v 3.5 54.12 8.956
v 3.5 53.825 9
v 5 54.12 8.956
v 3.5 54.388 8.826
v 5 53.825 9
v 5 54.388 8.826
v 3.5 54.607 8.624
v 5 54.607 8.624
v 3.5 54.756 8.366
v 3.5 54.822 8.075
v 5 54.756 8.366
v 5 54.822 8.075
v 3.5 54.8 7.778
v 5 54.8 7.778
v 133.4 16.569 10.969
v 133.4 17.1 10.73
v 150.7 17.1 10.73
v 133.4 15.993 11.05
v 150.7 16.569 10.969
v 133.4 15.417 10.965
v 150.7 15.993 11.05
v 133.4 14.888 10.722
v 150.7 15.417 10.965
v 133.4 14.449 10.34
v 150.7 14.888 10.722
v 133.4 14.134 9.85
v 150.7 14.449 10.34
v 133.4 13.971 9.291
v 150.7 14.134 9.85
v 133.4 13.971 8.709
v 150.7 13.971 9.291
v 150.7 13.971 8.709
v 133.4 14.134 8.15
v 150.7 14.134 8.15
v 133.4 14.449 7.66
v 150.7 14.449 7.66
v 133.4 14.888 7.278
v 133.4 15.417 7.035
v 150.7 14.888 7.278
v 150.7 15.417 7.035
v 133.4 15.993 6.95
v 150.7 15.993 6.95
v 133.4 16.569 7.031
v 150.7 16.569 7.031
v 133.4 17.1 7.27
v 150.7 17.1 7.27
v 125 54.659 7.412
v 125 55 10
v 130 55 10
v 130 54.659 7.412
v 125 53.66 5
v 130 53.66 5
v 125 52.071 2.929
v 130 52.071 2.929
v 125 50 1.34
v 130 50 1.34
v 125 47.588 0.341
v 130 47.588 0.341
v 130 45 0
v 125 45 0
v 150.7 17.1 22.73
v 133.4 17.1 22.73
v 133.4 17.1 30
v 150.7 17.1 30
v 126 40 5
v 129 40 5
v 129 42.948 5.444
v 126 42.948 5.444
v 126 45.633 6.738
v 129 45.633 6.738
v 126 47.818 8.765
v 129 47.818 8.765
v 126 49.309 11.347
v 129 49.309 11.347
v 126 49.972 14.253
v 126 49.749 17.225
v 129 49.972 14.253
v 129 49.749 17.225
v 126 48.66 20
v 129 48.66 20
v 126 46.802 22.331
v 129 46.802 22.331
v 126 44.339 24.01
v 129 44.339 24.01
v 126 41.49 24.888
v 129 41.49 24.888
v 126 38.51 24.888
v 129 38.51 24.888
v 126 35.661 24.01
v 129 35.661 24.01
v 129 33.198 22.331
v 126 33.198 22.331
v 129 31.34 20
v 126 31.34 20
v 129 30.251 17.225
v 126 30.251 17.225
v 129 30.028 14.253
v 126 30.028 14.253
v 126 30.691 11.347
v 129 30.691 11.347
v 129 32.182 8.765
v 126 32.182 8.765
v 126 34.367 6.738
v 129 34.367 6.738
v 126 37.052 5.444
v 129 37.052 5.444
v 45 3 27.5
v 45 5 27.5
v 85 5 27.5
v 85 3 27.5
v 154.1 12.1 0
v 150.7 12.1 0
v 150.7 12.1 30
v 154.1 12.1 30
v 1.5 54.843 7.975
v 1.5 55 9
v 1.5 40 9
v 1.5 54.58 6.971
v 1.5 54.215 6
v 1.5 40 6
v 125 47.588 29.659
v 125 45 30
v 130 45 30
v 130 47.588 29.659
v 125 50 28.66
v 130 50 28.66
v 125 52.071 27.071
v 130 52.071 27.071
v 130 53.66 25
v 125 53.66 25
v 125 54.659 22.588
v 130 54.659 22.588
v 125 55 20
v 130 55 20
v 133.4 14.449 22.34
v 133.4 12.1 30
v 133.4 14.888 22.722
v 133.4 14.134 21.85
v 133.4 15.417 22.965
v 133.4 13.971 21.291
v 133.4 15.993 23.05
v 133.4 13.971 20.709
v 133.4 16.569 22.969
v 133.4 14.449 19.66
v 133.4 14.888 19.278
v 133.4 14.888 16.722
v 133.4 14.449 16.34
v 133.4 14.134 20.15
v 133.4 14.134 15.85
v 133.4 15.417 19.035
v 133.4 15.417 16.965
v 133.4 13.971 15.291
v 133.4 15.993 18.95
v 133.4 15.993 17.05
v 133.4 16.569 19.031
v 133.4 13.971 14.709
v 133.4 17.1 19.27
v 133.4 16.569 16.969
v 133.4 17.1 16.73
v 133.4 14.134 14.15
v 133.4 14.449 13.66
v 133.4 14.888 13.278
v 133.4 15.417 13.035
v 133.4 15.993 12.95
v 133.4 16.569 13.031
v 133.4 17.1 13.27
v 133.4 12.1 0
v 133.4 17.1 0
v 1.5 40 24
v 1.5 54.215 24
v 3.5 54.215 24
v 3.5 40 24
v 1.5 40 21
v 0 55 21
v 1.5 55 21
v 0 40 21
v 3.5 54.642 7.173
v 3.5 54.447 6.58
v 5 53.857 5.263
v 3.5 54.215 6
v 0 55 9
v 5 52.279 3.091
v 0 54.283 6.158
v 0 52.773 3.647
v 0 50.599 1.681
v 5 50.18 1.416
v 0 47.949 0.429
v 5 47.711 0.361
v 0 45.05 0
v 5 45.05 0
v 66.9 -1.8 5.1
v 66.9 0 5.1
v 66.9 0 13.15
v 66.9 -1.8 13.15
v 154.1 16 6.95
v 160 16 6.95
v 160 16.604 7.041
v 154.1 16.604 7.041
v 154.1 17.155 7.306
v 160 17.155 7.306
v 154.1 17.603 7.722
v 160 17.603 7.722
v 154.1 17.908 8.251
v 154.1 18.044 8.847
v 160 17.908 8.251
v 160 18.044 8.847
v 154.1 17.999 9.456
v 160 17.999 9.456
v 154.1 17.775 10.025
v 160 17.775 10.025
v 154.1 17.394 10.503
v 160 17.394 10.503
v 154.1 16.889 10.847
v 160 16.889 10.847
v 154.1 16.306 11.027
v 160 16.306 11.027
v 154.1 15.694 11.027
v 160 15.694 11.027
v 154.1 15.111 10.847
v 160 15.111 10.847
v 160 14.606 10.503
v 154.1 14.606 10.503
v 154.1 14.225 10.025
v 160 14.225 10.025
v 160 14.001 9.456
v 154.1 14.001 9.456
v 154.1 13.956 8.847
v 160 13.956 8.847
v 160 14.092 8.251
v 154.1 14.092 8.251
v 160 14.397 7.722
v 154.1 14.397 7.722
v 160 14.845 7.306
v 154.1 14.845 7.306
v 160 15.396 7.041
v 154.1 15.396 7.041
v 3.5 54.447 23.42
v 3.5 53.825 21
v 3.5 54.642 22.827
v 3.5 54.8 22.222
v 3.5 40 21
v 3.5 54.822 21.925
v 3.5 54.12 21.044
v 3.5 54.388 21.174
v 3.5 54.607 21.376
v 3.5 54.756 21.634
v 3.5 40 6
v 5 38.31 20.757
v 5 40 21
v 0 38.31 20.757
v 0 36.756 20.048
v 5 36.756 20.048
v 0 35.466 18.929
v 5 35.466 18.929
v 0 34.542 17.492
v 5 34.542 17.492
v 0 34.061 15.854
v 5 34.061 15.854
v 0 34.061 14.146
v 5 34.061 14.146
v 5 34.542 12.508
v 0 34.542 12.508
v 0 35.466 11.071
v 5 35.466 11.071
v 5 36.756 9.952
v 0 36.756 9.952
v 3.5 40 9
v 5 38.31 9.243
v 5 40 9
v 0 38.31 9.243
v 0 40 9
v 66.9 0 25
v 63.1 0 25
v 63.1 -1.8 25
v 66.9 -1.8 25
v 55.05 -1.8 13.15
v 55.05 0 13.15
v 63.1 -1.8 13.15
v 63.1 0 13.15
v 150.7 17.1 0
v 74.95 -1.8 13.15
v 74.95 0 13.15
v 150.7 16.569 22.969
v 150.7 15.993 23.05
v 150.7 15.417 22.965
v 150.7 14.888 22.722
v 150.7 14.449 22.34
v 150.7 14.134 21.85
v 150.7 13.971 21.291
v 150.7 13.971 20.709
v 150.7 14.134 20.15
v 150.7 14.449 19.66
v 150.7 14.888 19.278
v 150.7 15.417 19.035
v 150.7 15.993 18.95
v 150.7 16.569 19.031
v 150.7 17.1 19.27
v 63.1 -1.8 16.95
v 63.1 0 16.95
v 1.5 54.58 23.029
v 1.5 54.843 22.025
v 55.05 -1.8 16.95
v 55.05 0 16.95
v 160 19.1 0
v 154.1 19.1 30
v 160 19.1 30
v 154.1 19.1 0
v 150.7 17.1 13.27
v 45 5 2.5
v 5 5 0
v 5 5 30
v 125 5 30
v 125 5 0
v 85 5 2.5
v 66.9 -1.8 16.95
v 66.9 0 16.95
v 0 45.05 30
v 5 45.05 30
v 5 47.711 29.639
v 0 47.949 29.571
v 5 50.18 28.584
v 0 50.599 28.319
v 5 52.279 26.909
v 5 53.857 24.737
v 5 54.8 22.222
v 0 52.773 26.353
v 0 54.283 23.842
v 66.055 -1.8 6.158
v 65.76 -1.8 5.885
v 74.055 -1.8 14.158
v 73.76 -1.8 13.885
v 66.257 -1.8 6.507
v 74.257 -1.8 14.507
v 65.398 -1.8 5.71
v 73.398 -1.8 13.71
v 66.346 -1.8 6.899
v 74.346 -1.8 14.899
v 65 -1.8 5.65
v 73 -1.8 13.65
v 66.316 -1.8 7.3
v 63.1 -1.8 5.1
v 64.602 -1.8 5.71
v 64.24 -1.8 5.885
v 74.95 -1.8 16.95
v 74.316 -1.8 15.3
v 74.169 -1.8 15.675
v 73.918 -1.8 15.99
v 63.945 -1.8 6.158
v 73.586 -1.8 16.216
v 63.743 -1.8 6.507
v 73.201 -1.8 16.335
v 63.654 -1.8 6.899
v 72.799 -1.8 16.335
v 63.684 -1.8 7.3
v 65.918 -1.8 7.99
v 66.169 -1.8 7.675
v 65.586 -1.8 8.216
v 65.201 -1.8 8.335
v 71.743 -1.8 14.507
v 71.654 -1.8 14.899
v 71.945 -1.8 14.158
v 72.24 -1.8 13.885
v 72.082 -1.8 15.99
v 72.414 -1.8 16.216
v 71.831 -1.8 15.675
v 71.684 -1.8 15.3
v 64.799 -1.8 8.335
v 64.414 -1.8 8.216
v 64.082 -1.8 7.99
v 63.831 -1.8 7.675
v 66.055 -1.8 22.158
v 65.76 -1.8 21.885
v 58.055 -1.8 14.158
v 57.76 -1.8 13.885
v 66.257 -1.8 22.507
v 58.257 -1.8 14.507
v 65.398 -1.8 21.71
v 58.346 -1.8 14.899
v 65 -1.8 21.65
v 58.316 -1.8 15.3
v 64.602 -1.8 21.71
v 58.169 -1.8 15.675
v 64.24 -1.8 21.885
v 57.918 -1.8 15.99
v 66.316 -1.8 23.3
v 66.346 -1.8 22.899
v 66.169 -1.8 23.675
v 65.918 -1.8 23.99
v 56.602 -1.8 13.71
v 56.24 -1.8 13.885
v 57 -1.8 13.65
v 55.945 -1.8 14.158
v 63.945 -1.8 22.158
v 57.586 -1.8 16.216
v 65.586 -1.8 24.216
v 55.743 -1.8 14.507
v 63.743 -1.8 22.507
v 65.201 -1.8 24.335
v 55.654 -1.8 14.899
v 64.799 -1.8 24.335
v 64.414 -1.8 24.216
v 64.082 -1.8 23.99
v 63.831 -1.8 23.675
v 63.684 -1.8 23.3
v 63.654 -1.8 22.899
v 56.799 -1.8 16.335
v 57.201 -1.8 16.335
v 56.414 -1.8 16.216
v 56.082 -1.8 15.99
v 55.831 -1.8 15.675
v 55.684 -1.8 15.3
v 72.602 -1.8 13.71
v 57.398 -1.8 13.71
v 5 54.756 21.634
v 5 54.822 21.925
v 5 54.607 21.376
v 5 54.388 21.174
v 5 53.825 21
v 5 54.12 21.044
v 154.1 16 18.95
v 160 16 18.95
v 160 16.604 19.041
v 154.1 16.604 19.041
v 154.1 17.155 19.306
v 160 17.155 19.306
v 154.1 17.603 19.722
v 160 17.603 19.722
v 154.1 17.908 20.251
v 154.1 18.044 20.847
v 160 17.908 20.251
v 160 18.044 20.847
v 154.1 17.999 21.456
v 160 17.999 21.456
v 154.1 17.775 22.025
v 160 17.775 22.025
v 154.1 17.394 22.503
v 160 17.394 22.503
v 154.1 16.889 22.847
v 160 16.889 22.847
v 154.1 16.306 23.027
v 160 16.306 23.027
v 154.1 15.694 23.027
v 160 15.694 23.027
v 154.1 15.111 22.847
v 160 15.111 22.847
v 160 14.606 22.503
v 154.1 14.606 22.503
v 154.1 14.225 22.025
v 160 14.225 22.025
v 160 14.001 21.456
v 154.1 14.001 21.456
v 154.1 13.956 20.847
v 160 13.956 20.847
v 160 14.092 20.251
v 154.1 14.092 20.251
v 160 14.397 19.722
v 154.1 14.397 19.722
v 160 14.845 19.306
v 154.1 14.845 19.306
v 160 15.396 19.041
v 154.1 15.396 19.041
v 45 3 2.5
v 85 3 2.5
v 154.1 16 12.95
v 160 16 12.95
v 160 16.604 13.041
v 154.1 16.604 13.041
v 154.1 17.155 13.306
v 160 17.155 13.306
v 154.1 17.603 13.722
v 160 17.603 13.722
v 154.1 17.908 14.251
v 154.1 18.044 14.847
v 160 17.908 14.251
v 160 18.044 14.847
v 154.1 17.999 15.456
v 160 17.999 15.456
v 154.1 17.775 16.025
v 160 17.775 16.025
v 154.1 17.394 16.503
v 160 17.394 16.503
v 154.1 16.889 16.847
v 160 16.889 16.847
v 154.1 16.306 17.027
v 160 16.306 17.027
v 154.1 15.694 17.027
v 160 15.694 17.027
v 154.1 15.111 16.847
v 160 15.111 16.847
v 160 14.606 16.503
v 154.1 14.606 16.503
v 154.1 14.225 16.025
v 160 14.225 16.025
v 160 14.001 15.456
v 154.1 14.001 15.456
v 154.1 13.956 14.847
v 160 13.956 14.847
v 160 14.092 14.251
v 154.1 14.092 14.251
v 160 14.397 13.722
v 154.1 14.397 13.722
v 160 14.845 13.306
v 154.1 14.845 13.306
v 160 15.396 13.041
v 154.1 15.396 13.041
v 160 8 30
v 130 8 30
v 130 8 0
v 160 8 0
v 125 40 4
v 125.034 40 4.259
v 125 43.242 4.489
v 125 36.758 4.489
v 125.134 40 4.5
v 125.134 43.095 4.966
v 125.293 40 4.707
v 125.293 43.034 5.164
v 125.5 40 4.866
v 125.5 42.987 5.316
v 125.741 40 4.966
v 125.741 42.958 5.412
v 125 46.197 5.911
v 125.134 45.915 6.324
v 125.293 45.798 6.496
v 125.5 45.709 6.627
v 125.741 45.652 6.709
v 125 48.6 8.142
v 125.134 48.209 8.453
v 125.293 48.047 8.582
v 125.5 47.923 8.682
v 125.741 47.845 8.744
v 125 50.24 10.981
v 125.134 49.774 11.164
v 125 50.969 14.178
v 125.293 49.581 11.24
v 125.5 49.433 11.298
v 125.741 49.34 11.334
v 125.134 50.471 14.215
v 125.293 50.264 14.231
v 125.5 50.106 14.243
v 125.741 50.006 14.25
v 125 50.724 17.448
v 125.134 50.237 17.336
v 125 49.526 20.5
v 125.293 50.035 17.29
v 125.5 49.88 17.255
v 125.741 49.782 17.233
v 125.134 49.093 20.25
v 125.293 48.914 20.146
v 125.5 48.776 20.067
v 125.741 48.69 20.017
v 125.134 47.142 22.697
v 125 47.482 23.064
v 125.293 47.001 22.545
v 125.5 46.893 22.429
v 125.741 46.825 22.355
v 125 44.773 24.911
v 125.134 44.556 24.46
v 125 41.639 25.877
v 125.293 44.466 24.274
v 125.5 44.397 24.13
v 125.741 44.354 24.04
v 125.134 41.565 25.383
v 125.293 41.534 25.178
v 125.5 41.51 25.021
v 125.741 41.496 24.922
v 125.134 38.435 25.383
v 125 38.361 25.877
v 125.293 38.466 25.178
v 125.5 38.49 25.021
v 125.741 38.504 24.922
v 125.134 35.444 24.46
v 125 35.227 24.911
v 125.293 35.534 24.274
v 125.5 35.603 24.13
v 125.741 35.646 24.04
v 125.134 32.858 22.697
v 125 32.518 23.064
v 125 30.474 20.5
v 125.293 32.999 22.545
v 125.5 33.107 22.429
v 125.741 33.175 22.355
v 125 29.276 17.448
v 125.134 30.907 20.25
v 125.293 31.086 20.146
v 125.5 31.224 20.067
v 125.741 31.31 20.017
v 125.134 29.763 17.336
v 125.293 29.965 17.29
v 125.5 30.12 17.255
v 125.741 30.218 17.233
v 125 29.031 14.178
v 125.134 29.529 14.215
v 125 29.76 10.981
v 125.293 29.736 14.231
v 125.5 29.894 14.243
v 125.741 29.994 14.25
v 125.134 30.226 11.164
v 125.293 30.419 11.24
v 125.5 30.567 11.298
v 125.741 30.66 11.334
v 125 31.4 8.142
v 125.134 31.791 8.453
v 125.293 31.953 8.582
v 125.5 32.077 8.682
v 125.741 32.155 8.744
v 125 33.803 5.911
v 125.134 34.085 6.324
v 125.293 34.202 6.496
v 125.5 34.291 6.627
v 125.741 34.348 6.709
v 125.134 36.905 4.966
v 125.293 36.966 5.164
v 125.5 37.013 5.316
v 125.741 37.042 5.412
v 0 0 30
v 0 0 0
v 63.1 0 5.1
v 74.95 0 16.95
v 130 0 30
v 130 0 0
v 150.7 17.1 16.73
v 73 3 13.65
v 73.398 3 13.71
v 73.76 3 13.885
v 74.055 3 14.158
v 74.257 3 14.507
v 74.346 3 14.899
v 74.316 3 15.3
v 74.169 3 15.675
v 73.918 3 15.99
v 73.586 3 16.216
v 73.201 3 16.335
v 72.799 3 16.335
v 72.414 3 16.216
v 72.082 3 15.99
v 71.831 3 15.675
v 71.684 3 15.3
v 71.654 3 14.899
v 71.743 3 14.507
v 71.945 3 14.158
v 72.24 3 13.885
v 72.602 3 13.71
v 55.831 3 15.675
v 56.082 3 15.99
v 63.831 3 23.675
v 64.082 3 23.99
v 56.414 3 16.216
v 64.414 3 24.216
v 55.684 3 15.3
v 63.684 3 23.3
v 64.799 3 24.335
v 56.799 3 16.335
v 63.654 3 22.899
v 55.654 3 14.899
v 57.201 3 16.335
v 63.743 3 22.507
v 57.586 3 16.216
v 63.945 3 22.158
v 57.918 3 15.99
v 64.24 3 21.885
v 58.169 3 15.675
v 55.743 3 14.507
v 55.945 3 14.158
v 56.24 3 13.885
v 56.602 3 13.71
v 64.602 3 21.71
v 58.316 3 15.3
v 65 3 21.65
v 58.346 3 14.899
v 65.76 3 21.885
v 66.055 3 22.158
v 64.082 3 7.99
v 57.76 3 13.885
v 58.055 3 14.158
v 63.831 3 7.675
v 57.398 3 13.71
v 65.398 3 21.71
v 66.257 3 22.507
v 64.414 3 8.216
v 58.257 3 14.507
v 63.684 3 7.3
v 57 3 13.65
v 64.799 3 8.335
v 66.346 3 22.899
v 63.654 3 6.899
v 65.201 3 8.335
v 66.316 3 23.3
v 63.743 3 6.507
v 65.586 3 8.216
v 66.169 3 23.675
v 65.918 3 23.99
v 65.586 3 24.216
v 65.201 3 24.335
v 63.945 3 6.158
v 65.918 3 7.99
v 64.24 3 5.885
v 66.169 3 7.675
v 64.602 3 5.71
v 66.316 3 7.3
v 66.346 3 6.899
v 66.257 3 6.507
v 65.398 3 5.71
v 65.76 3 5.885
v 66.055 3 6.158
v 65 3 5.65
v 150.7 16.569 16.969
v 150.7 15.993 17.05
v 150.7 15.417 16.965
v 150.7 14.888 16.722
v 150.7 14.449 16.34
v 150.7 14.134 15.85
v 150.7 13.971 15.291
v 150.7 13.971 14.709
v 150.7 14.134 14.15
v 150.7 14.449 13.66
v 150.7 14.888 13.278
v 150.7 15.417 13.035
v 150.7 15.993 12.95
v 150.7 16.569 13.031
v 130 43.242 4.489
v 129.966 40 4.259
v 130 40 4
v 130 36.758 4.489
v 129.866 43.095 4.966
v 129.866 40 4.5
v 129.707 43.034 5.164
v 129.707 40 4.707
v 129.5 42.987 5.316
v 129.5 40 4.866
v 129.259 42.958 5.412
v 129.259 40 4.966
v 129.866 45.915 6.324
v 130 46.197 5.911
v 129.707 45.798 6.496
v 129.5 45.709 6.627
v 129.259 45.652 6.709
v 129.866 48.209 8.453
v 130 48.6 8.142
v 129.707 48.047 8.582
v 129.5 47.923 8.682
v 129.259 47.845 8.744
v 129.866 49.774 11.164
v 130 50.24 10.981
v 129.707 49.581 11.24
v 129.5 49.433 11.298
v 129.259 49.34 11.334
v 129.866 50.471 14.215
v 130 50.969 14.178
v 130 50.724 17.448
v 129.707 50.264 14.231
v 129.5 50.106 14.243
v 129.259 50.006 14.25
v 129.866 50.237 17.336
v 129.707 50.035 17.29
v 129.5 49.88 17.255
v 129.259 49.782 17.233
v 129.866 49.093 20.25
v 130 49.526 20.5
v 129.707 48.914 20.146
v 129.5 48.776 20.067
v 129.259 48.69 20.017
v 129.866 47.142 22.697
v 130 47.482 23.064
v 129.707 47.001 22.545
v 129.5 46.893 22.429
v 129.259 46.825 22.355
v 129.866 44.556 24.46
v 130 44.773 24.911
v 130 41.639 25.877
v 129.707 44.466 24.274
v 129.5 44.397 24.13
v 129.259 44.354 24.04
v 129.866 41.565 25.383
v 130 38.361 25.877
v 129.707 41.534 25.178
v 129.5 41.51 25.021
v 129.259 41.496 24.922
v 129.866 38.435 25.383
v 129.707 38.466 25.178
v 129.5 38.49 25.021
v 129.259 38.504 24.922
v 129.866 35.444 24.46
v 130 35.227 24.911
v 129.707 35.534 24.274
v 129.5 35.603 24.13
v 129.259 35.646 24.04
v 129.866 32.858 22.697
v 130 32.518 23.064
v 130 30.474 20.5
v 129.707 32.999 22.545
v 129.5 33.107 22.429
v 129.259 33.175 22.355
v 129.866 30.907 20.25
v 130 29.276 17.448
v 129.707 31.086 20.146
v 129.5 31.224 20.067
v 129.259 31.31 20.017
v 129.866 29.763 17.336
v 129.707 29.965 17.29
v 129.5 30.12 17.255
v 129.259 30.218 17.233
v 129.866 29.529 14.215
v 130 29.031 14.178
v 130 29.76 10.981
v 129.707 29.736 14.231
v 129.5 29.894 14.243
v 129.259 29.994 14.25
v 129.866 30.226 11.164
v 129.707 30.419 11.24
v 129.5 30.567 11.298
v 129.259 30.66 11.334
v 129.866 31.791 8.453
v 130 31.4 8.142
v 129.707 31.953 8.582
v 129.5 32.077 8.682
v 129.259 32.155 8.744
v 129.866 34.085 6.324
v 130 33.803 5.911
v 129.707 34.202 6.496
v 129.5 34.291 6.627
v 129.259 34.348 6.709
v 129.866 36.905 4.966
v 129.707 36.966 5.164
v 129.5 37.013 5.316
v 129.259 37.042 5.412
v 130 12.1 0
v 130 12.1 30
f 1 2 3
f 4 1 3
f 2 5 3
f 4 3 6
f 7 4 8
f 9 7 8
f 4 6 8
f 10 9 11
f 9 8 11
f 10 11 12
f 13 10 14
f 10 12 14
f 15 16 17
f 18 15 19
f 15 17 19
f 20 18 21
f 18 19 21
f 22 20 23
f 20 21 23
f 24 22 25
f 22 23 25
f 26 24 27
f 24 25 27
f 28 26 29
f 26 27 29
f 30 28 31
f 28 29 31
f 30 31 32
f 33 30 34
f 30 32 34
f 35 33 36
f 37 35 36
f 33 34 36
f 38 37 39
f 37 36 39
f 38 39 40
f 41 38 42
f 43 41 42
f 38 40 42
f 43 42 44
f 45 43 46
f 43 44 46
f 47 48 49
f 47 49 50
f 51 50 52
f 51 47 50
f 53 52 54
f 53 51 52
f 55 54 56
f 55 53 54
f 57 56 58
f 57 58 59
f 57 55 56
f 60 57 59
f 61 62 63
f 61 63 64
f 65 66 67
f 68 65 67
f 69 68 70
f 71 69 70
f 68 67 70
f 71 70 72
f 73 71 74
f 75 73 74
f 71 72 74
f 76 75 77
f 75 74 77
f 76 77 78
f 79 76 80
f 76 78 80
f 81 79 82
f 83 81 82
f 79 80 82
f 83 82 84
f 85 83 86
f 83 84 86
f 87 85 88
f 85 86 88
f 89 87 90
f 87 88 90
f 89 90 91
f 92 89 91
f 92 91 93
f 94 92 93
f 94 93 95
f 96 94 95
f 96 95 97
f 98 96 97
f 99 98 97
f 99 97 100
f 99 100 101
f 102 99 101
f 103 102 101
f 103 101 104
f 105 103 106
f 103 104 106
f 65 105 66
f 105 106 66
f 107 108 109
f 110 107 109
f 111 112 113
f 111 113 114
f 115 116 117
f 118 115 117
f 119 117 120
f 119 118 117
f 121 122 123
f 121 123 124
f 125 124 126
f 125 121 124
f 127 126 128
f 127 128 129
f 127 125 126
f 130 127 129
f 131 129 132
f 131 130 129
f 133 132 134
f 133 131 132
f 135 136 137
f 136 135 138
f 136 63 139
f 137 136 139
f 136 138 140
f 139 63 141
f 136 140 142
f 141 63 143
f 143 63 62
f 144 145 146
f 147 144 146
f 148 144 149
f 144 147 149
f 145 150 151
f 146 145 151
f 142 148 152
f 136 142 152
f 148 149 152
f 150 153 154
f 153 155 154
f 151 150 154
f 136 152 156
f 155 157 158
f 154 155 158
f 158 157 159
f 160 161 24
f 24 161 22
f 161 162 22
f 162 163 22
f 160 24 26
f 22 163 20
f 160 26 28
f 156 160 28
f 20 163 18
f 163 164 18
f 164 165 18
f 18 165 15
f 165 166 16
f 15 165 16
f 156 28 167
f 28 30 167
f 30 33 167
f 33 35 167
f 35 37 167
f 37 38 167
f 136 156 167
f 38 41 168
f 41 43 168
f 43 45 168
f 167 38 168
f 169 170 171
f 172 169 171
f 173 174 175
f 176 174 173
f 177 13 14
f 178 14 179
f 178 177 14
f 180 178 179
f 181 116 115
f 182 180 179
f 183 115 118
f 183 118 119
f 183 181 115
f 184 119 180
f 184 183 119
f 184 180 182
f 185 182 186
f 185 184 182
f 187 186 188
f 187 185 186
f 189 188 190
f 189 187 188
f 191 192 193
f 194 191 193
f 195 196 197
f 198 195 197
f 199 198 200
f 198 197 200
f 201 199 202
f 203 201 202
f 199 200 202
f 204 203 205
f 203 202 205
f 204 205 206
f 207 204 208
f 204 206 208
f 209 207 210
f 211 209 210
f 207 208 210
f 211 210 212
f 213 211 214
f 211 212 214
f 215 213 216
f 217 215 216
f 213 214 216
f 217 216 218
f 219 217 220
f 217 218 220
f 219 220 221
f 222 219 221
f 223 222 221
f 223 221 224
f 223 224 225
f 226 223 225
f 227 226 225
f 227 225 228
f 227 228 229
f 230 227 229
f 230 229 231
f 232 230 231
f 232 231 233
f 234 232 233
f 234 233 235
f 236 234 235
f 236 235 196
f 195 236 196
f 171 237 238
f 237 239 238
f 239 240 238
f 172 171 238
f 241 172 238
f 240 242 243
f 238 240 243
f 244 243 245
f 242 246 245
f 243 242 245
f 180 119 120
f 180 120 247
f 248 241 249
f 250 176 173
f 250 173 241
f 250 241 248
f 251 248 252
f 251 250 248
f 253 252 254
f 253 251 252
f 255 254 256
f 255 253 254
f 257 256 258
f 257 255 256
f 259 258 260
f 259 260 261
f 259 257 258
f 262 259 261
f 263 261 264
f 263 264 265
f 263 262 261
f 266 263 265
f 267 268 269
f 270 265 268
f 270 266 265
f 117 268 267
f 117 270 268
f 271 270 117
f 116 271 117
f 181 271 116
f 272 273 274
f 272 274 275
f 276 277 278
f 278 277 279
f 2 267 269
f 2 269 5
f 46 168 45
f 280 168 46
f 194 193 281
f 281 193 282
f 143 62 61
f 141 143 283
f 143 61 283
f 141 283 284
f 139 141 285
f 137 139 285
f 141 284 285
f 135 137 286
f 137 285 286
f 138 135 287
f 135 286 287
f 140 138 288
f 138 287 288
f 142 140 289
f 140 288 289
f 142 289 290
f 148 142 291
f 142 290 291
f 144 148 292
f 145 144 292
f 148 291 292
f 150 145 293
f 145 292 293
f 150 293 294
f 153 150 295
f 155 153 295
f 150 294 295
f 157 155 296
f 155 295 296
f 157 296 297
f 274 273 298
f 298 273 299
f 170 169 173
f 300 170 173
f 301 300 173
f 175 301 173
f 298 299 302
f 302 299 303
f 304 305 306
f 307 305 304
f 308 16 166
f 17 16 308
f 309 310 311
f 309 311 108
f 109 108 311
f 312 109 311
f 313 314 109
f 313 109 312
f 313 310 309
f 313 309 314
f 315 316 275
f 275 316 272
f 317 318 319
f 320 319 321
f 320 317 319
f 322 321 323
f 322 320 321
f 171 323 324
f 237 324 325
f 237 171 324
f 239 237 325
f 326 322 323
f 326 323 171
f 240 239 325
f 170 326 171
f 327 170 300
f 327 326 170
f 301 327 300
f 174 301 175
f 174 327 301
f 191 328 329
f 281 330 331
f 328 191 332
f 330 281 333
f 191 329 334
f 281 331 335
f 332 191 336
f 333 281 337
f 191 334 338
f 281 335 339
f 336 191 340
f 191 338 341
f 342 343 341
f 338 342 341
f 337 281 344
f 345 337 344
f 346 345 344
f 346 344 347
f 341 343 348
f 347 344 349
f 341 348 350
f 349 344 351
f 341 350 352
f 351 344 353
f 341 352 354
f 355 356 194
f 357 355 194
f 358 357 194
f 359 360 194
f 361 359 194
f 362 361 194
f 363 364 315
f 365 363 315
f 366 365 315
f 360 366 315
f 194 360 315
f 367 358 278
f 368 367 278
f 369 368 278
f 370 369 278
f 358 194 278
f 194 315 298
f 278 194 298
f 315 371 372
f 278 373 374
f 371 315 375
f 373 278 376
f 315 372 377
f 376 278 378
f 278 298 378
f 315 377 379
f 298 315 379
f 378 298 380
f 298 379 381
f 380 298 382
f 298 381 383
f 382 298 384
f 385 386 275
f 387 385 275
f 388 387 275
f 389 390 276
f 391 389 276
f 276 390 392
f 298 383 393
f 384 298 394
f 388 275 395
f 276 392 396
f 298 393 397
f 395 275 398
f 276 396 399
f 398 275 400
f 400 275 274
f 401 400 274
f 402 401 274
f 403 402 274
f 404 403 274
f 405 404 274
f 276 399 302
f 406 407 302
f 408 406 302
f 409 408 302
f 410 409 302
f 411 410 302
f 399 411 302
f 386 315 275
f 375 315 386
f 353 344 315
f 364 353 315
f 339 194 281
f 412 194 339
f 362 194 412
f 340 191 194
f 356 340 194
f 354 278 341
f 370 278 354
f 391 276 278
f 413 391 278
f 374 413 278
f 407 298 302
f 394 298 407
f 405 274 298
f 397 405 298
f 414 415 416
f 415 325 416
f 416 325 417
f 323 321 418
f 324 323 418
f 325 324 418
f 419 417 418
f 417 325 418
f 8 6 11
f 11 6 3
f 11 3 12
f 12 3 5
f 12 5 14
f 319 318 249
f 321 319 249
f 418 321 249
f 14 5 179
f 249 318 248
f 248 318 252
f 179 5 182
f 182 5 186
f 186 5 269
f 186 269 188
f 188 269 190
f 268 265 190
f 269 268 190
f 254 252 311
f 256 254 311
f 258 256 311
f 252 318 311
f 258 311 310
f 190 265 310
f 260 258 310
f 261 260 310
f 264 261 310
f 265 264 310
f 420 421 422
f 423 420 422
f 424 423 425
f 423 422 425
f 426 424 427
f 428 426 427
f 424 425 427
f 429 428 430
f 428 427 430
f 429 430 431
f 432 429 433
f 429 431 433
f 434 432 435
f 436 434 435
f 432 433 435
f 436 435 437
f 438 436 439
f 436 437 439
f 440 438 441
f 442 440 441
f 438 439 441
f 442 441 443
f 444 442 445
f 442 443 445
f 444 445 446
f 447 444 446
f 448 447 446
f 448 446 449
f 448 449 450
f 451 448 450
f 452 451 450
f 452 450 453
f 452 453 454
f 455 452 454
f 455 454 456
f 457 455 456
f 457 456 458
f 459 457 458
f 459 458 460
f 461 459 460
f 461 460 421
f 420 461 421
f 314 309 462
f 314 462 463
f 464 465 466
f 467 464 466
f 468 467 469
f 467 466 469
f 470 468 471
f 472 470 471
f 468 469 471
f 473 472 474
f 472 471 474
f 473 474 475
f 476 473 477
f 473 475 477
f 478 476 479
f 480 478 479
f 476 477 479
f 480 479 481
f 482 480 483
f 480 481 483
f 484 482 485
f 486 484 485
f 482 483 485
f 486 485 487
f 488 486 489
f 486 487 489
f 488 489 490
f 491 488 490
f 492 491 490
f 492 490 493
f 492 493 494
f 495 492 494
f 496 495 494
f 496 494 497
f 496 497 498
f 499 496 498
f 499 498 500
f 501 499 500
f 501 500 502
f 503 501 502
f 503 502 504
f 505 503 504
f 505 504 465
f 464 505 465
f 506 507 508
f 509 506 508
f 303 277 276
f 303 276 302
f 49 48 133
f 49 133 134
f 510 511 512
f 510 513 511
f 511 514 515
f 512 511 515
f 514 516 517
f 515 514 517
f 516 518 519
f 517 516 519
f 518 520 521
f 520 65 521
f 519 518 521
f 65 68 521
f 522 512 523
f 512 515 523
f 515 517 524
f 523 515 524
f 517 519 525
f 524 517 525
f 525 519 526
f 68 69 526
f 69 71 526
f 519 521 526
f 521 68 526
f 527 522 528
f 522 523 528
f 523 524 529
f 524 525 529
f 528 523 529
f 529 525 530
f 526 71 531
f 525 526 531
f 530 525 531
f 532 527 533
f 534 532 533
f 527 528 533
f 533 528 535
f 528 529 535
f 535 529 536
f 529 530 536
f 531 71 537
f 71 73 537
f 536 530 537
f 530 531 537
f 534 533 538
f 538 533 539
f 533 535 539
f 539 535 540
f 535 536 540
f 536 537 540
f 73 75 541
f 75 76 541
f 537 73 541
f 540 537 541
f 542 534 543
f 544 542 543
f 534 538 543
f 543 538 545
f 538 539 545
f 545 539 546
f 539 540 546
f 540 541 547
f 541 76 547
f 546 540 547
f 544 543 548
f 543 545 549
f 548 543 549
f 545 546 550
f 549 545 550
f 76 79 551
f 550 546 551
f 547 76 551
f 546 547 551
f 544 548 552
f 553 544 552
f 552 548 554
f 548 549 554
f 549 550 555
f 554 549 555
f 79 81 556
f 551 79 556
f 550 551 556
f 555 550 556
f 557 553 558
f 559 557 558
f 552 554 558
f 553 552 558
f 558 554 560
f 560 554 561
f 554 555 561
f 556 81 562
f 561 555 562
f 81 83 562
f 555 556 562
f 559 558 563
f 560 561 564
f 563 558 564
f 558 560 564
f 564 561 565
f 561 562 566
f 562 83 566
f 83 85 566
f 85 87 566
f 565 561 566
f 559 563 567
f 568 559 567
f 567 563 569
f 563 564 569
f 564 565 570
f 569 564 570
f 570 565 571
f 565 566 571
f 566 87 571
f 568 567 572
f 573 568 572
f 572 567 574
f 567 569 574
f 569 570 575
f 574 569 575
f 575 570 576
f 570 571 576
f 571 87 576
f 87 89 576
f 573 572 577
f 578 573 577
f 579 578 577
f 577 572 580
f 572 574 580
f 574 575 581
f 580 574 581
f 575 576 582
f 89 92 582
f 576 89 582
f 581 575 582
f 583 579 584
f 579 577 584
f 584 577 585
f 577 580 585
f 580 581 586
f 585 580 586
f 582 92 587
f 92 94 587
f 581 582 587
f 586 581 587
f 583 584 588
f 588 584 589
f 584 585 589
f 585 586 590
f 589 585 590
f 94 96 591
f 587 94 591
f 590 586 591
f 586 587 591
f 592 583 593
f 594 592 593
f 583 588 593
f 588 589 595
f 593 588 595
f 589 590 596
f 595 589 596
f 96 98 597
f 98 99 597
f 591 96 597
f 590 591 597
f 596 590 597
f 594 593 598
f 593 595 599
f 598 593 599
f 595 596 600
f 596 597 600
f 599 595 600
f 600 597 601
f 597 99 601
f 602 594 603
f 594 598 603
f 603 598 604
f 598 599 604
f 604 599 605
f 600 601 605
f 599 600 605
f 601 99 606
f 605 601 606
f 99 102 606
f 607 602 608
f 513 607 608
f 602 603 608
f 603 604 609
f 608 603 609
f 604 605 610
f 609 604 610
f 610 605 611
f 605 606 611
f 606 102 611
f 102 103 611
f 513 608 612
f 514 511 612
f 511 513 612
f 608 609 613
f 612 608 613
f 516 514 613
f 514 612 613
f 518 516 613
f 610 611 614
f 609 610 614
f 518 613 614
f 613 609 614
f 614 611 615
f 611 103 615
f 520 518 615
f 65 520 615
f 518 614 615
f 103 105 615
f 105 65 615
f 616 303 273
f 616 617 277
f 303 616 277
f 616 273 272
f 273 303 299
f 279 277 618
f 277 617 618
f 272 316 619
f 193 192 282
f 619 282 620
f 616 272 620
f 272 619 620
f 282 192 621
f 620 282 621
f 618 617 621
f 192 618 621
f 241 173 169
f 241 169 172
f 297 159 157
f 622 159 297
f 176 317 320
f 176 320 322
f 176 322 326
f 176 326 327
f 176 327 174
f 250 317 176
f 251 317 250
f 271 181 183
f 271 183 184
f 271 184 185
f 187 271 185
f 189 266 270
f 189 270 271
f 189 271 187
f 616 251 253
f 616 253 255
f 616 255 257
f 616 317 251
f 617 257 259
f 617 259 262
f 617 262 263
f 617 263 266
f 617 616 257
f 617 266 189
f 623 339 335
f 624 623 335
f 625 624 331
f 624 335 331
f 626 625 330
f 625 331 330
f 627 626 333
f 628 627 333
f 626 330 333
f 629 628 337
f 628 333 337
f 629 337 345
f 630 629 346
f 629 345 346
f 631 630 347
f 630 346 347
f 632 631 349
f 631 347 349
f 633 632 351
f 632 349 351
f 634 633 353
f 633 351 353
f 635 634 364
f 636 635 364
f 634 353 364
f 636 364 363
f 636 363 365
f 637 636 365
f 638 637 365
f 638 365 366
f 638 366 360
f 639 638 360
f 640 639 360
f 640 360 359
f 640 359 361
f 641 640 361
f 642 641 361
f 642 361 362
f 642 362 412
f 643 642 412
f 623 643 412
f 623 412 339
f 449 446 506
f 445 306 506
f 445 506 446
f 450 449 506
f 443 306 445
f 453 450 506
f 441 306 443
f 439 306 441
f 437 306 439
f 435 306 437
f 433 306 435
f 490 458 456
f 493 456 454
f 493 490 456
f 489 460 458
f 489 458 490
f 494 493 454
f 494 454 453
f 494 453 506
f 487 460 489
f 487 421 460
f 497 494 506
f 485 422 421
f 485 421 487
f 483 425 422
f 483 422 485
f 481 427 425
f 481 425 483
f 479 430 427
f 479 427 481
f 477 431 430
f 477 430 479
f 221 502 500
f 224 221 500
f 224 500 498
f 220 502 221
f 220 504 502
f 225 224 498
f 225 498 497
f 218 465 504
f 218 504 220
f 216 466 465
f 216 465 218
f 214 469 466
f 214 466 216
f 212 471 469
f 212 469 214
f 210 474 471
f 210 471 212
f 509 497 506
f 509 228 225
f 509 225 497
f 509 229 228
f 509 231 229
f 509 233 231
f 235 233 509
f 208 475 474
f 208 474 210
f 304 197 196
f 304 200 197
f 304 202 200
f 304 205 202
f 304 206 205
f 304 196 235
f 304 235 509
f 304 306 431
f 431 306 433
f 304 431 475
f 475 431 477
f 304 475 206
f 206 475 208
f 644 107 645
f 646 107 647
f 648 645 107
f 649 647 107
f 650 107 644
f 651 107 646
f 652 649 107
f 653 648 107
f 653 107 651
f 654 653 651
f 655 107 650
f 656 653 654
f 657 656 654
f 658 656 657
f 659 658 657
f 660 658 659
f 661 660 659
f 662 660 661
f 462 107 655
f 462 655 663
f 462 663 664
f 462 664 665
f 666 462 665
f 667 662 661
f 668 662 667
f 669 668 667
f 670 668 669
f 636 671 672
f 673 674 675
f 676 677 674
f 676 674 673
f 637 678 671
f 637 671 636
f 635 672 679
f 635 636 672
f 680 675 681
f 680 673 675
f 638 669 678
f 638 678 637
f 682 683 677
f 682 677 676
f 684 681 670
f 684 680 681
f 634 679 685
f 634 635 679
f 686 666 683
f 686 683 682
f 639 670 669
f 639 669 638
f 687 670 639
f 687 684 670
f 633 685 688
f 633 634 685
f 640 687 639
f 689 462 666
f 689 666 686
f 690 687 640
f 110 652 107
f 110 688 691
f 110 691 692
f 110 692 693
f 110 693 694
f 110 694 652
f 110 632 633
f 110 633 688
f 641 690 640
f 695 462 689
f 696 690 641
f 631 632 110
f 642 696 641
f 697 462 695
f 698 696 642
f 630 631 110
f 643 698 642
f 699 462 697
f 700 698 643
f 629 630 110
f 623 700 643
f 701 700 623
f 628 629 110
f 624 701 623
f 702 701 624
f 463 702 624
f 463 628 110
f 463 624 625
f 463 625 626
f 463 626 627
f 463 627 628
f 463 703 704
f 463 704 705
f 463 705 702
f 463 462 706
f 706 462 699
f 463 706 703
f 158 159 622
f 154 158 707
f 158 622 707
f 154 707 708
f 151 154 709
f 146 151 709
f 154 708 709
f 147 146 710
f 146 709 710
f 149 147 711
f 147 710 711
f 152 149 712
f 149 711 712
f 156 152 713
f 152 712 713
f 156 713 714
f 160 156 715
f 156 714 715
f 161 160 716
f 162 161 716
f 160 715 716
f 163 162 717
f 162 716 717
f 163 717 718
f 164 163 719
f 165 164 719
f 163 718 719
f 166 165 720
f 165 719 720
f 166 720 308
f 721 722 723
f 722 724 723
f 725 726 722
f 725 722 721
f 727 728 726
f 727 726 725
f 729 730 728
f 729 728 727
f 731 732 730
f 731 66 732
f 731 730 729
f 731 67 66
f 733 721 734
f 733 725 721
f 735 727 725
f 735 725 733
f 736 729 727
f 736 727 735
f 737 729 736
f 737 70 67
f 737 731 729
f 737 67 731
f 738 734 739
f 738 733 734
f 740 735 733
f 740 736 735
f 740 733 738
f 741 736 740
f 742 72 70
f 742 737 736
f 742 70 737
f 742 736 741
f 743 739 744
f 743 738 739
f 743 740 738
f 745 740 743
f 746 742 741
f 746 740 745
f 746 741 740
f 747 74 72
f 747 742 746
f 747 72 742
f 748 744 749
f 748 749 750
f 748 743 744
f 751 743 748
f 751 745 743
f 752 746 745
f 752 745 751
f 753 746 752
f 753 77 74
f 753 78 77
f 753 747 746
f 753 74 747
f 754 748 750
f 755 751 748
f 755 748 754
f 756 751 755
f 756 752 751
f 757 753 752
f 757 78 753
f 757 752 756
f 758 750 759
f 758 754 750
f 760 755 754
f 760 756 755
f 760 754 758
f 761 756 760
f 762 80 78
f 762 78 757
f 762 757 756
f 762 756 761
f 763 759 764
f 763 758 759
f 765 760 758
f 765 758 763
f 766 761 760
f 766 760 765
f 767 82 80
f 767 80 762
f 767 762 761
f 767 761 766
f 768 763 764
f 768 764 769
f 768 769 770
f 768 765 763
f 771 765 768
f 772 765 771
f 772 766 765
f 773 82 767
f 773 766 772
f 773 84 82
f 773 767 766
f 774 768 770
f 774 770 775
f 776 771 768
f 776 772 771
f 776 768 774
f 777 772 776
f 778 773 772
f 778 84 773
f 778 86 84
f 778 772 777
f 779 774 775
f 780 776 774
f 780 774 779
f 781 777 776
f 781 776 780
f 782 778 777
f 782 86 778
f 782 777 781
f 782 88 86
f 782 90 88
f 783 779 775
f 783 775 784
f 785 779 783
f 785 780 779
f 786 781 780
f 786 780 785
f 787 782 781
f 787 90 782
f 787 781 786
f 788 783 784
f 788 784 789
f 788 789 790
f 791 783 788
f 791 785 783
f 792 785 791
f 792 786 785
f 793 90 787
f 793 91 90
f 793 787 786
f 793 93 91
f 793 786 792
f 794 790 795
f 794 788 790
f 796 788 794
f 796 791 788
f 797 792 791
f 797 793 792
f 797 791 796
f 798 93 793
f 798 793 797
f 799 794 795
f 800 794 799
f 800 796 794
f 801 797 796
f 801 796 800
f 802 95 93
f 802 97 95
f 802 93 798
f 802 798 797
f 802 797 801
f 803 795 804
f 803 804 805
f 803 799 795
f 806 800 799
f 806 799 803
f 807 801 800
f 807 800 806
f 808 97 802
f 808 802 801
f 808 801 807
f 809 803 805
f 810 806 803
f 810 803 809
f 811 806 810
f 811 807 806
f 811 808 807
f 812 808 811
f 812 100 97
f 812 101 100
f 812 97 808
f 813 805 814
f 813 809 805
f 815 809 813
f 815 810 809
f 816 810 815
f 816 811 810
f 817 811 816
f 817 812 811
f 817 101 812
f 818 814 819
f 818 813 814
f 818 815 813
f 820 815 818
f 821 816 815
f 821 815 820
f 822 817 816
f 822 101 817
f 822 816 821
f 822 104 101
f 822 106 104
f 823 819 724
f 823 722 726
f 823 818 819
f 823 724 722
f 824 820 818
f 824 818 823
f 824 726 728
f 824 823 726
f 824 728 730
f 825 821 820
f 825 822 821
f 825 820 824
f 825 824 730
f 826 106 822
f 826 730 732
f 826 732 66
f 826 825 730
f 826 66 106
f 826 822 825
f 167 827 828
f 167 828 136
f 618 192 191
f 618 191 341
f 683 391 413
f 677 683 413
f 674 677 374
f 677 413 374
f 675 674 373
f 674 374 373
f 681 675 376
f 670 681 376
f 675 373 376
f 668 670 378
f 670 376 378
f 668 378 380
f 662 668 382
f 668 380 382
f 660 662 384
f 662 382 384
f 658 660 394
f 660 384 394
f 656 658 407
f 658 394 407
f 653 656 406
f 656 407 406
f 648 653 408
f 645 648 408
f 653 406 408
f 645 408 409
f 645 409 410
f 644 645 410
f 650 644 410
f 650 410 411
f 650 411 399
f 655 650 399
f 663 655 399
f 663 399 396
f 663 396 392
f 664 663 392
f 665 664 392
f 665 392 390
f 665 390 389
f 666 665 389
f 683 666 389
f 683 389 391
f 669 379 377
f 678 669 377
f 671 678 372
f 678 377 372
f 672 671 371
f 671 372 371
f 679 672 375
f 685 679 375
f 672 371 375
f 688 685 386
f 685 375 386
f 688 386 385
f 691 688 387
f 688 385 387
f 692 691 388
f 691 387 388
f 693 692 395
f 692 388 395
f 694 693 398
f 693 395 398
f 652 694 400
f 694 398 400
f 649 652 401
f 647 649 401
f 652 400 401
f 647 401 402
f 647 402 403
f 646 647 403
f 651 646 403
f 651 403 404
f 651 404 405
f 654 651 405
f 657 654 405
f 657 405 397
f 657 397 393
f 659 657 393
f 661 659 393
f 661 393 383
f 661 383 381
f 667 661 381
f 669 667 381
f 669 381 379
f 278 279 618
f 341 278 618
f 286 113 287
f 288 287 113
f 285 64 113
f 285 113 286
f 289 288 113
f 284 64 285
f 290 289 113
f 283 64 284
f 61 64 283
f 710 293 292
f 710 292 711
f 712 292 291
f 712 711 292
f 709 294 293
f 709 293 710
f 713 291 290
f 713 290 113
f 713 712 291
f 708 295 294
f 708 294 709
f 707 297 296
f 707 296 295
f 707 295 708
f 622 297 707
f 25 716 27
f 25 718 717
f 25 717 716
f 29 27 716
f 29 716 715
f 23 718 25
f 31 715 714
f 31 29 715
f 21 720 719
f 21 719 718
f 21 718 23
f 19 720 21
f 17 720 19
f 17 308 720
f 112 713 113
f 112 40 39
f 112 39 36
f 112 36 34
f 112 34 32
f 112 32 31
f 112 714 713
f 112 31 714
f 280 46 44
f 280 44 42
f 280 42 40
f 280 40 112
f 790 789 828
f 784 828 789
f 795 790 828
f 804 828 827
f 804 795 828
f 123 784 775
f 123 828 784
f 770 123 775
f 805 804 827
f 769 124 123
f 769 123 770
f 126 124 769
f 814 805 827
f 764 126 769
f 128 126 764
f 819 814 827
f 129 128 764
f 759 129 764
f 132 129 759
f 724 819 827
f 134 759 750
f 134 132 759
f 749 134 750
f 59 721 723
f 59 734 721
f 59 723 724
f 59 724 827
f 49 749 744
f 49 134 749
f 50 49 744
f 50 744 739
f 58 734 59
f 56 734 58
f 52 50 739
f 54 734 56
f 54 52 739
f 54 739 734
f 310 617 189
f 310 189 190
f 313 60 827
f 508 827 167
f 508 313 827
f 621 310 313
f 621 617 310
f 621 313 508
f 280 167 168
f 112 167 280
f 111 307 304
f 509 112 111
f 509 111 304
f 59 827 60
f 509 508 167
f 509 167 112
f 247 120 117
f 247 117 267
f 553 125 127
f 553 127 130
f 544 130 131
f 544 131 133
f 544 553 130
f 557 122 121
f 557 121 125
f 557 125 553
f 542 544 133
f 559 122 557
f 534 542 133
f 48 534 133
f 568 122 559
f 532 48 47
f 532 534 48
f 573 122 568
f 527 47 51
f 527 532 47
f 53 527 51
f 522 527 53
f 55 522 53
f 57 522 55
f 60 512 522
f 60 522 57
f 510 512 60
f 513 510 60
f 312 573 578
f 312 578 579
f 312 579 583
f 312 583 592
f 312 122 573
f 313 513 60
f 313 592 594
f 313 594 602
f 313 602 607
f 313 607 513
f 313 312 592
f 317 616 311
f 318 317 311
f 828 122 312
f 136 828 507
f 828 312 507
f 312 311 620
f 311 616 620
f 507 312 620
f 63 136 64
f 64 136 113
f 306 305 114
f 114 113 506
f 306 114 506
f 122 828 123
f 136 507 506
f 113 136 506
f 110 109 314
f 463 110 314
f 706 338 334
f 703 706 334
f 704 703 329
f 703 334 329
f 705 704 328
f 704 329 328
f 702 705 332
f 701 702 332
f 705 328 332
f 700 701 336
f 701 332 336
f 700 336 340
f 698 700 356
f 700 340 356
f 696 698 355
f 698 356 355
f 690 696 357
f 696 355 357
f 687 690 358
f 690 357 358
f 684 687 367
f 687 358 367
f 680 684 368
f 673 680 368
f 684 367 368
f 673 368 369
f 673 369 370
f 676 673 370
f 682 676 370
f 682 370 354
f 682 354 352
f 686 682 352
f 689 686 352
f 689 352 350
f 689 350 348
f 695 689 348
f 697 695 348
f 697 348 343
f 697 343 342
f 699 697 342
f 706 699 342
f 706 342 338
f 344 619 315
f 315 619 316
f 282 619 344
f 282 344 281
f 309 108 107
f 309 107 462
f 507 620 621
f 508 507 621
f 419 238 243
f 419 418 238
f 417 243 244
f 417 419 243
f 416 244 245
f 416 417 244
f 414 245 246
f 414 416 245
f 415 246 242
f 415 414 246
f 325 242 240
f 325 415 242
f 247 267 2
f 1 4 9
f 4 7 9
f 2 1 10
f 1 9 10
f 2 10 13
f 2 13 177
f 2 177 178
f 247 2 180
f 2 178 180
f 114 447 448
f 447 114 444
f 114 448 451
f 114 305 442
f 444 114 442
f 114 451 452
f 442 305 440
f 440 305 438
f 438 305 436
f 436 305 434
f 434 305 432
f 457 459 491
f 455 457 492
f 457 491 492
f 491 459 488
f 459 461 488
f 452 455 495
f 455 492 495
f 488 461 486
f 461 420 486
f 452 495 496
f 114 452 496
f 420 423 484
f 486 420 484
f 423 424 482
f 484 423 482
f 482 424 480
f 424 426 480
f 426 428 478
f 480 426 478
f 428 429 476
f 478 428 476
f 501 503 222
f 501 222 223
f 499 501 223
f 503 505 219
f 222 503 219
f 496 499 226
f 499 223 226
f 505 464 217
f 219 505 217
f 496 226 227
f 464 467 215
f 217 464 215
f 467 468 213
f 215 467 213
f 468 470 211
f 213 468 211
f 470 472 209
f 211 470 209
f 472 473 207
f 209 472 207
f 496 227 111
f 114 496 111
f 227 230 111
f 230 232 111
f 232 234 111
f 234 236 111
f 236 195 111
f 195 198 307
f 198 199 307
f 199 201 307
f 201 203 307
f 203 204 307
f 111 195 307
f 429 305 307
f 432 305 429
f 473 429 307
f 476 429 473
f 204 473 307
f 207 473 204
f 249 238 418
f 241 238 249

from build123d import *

# Parameters (mm, degrees)
SKETCH1_W           = 130
SKETCH1_H           = 30
BOSS_EXTRUDE1_DEPTH = 5
BOSS_EXTRUDE3_DEPTH = 1.8
SKETCH6_W           = 40
SKETCH6_H           = 25
CUT_EXTRUDE2_DEPTH  = 2
SKETCH5_R           = 1.35
CUT_EXTRUDE3_DEPTH  = 6
SKETCH8_W           = 5
SKETCH8_H           = 30
BOSS_EXTRUDE4_DEPTH = 50
SKETCH9_R           = 10
CUT_EXTRUDE4_DEPTH  = 5
SKETCH10_W          = 30
SKETCH10_H          = 11.1
BOSS_EXTRUDE5_DEPTH = 30
SKETCH11_W          = 3.4
SKETCH11_H          = 30
CUT_EXTRUDE5_DEPTH  = 7
CUT_EXTRUDE6_REACH  = 173.828
SKETCH12_R          = 2.05
CUT_EXTRUDE7_DEPTH  = 5
SKETCH14_W          = 17.3
SKETCH14_H          = 30
CUT_EXTRUDE8_DEPTH  = 2
SKETCH15_W          = 2
SKETCH15_H          = 3
CUT_EXTRUDE9_DEPTH  = 15
FILLET1_START       = -1
FILLET1_DEPTH       = 161
FILLET1_START_2     = 5
FILLET1_2_DEPTH     = 155
FILLET3_R           = 1
FILLET6_R           = 1


with BuildPart() as part:
    # Sketch1 → Boss-Extrude1 (new body)
    with BuildSketch(Plane(origin=(0, 0, 0), x_dir=(1, 0, 0), z_dir=(0, 1, 0))):
        with Locations((65, -15)):
            Rectangle(SKETCH1_W, SKETCH1_H)
    extrude(amount=BOSS_EXTRUDE1_DEPTH)

    # Sketch4 → Boss-Extrude3 (add)
    with BuildSketch(Plane.XZ):
        Polygon((63.1, 25), (66.9, 25), (66.9, 17), (66.9, 16.95), (67.95, 16.95), (74.95, 16.95), (74.95, 13.15), (66.95, 13.15), (66.9, 13.15), (66.9, 12.1), (66.9, 5.1), (63.1, 5.1), (63.1, 13.1), (63.1, 13.15), (62.05, 13.15), (55.05, 13.15), (55.05, 16.95), (63.05, 16.95), (63.1, 16.95), (63.1, 18), align=None)
    extrude(amount=BOSS_EXTRUDE3_DEPTH)

    # Sketch6 → Cut-Extrude2 (cut)
    with BuildSketch(Plane(origin=(0, 5, 0), x_dir=(1, 0, 0), z_dir=(0, 1, 0))):
        with Locations((65, -15)):
            Rectangle(SKETCH6_W, SKETCH6_H)
    extrude(amount=-CUT_EXTRUDE2_DEPTH, mode=Mode.SUBTRACT)

    # Sketch5 → Cut-Extrude3 (cut)
    with BuildSketch(Plane.XZ.offset(1.8)):
        with Locations(Location((65, 23, 0), (0, 0, 270))):
            Circle(SKETCH5_R)
        with Locations(Location((73, 15, 0), (0, 0, 270))):
            Circle(SKETCH5_R)
        with Locations(Location((57, 15, 0), (0, 0, 270))):
            Circle(SKETCH5_R)
        with Locations(Location((65, 7, 0), (0, 0, 270))):
            Circle(SKETCH5_R)
    extrude(amount=-CUT_EXTRUDE3_DEPTH, mode=Mode.SUBTRACT)

    # Sketch8 → Boss-Extrude4 (add)
    with BuildSketch(Plane(origin=(0, 5, 0), x_dir=(1, 0, 0), z_dir=(0, 1, 0))):
        with Locations((2.5, -15)):
            Rectangle(SKETCH8_W, SKETCH8_H)
        with Locations((127.5, -15)):
            Rectangle(SKETCH8_W, SKETCH8_H)
    extrude(amount=BOSS_EXTRUDE4_DEPTH)

    # Sketch9 → Cut-Extrude4 (cut)
    with BuildSketch(Plane(origin=(130, 0, 0), x_dir=(0, 0, -1), z_dir=(1, 0, 0))):
        with Locations((-15, 40)):
            Circle(SKETCH9_R)
    extrude(amount=-CUT_EXTRUDE4_DEPTH, mode=Mode.SUBTRACT)

    # Sketch10 → Boss-Extrude5 (add)
    with BuildSketch(Plane(origin=(130, 0, 0), x_dir=(0, 0, -1), z_dir=(1, 0, 0))):
        with Locations((-15, 13.55)):
            Rectangle(SKETCH10_W, SKETCH10_H)
    extrude(amount=BOSS_EXTRUDE5_DEPTH)

    # Sketch11 → Cut-Extrude5 (cut)
    with BuildSketch(Plane(origin=(0, 19.1, 0), x_dir=(1, 0, 0), z_dir=(0, 1, 0))):
        with Locations((131.7, -15)):
            Rectangle(SKETCH11_W, SKETCH11_H)
        with Locations((152.4, -15)):
            Rectangle(SKETCH11_W, SKETCH11_H)
    extrude(amount=-CUT_EXTRUDE5_DEPTH, mode=Mode.SUBTRACT)

    # Cut-Extrude6: up to this face of the body (flat: up to its plane)
    cut_extrude6_end = Plane(part.part.faces().sort_by_distance((130, 12.623489255, 15))[0])
    # Sketch12 → Cut-Extrude6 (cut, up to the picked face)
    with BuildSketch(Plane(origin=(160, 0, 0), x_dir=(0, 0, -1), z_dir=(1, 0, 0)), mode=Mode.PRIVATE) as cut_extrude6_sk1:
        with Locations((-15, 16)):
            Circle(SKETCH12_R)
    cut_extrude6_tool1 = split(extrude(cut_extrude6_sk1.sketch, amount=-CUT_EXTRUDE6_REACH, mode=Mode.PRIVATE), bisect_by=cut_extrude6_end, keep=Keep.BOTH, mode=Mode.PRIVATE)
    # Sketch12 → Cut-Extrude6 (cut, up to the picked face)
    with BuildSketch(Plane(origin=(160, 0, 0), x_dir=(0, 0, -1), z_dir=(1, 0, 0)), mode=Mode.PRIVATE) as cut_extrude6_sk2:
        with Locations((-21, 16)):
            Circle(SKETCH12_R)
    cut_extrude6_tool2 = split(extrude(cut_extrude6_sk2.sketch, amount=-CUT_EXTRUDE6_REACH, mode=Mode.PRIVATE), bisect_by=cut_extrude6_end, keep=Keep.BOTH, mode=Mode.PRIVATE)
    # Sketch12 → Cut-Extrude6 (cut, up to the picked face)
    with BuildSketch(Plane(origin=(160, 0, 0), x_dir=(0, 0, -1), z_dir=(1, 0, 0)), mode=Mode.PRIVATE) as cut_extrude6_sk3:
        with Locations((-9, 16)):
            Circle(SKETCH12_R)
    cut_extrude6_tool3 = split(extrude(cut_extrude6_sk3.sketch, amount=-CUT_EXTRUDE6_REACH, mode=Mode.PRIVATE), bisect_by=cut_extrude6_end, keep=Keep.BOTH, mode=Mode.PRIVATE)
    add(cut_extrude6_tool1.solids().sort_by(Axis((160, 16, 15), (-1, 0, 0)))[0], mode=Mode.SUBTRACT)
    add(cut_extrude6_tool2.solids().sort_by(Axis((160, 16, 21), (-1, 0, 0)))[0], mode=Mode.SUBTRACT)
    add(cut_extrude6_tool3.solids().sort_by(Axis((160, 16, 9), (-1, 0, 0)))[0], mode=Mode.SUBTRACT)

    # Sketch13 → Cut-Extrude7 (cut)
    with BuildSketch(Plane.ZY):
        with BuildLine():
            Line((9, 40), (9, 55))
            Line((9, 55), (21, 55))
            Line((21, 55), (21, 40))
            ThreePointArc((21, 40), (15, 34), (9, 40))
        make_face()
    extrude(amount=-CUT_EXTRUDE7_DEPTH, mode=Mode.SUBTRACT)

    # Sketch14 → Cut-Extrude8 (cut)
    with BuildSketch(Plane(origin=(0, 19.1, 0), x_dir=(1, 0, 0), z_dir=(0, 1, 0))):
        with Locations((142.05, -15)):
            Rectangle(SKETCH14_W, SKETCH14_H)
    extrude(amount=-CUT_EXTRUDE8_DEPTH, mode=Mode.SUBTRACT)

    # Sketch15 → Cut-Extrude9 (cut)
    with BuildSketch(Plane(origin=(0, 55, 0), x_dir=(1, 0, 0), z_dir=(0, 1, 0))):
        with Locations((2.5, -7.5)):
            Rectangle(SKETCH15_W, SKETCH15_H)
        with Locations((2.5, -22.5)):
            Rectangle(SKETCH15_W, SKETCH15_H)
    extrude(amount=-CUT_EXTRUDE9_DEPTH, mode=Mode.SUBTRACT)

    # Fillet1: read off the stored shape, not the designer's step
    # Fillet1 outline → Fillet1 (cut)
    with BuildSketch(Plane.YZ.offset(FILLET1_START)):
        with BuildLine():
            Line((55, 0), (55, 9))
            ThreePointArc((55, 9), (51.758329561, 2.583801513), (45.050125629, 0))
            Line((45.050125629, 0), (55, 0))
        make_face()
        with BuildLine():
            ThreePointArc((45.050125629, 30), (51.758329561, 27.416198487), (55, 21))
            Line((55, 21), (55, 30))
            Line((55, 30), (45.050125629, 30))
        make_face()
    extrude(amount=FILLET1_DEPTH, mode=Mode.SUBTRACT)

    # Fillet1 2 outline → Fillet1 2 (cut)
    with BuildSketch(Plane.YZ.offset(FILLET1_START_2)):
        with BuildLine():
            ThreePointArc((45, 30), (52.071067812, 27.071067812), (55, 20))
            Line((55, 20), (55, 21))
            ThreePointArc((55, 21), (51.758329561, 27.416198487), (45.050125629, 30))
            Line((45.050125629, 30), (45, 30))
        make_face()
        with BuildLine():
            ThreePointArc((45.050125629, 0), (51.758329561, 2.583801513), (55, 9))
            Line((55, 9), (55, 10))
            ThreePointArc((55, 10), (52.071067812, 2.928932188), (45, 0))
            Line((45, 0), (45.050125629, 0))
        make_face()
    extrude(amount=FILLET1_2_DEPTH, mode=Mode.SUBTRACT)

    # Fillet3
    fillet3_edges = [part.edges().sort_by_distance(p)[0] for p in [
        (4.25, 55, 9),
        (4.25, 55, 21),
    ]]
    fillet(fillet3_edges, radius=FILLET3_R)

    # Fillet6
    fillet6_edges = [part.edges().sort_by_distance(p)[0] for p in [
        (130, 40, 25),
        (125, 40, 25),
    ]]
    fillet(fillet6_edges, radius=FILLET6_R)


solid = part.part
